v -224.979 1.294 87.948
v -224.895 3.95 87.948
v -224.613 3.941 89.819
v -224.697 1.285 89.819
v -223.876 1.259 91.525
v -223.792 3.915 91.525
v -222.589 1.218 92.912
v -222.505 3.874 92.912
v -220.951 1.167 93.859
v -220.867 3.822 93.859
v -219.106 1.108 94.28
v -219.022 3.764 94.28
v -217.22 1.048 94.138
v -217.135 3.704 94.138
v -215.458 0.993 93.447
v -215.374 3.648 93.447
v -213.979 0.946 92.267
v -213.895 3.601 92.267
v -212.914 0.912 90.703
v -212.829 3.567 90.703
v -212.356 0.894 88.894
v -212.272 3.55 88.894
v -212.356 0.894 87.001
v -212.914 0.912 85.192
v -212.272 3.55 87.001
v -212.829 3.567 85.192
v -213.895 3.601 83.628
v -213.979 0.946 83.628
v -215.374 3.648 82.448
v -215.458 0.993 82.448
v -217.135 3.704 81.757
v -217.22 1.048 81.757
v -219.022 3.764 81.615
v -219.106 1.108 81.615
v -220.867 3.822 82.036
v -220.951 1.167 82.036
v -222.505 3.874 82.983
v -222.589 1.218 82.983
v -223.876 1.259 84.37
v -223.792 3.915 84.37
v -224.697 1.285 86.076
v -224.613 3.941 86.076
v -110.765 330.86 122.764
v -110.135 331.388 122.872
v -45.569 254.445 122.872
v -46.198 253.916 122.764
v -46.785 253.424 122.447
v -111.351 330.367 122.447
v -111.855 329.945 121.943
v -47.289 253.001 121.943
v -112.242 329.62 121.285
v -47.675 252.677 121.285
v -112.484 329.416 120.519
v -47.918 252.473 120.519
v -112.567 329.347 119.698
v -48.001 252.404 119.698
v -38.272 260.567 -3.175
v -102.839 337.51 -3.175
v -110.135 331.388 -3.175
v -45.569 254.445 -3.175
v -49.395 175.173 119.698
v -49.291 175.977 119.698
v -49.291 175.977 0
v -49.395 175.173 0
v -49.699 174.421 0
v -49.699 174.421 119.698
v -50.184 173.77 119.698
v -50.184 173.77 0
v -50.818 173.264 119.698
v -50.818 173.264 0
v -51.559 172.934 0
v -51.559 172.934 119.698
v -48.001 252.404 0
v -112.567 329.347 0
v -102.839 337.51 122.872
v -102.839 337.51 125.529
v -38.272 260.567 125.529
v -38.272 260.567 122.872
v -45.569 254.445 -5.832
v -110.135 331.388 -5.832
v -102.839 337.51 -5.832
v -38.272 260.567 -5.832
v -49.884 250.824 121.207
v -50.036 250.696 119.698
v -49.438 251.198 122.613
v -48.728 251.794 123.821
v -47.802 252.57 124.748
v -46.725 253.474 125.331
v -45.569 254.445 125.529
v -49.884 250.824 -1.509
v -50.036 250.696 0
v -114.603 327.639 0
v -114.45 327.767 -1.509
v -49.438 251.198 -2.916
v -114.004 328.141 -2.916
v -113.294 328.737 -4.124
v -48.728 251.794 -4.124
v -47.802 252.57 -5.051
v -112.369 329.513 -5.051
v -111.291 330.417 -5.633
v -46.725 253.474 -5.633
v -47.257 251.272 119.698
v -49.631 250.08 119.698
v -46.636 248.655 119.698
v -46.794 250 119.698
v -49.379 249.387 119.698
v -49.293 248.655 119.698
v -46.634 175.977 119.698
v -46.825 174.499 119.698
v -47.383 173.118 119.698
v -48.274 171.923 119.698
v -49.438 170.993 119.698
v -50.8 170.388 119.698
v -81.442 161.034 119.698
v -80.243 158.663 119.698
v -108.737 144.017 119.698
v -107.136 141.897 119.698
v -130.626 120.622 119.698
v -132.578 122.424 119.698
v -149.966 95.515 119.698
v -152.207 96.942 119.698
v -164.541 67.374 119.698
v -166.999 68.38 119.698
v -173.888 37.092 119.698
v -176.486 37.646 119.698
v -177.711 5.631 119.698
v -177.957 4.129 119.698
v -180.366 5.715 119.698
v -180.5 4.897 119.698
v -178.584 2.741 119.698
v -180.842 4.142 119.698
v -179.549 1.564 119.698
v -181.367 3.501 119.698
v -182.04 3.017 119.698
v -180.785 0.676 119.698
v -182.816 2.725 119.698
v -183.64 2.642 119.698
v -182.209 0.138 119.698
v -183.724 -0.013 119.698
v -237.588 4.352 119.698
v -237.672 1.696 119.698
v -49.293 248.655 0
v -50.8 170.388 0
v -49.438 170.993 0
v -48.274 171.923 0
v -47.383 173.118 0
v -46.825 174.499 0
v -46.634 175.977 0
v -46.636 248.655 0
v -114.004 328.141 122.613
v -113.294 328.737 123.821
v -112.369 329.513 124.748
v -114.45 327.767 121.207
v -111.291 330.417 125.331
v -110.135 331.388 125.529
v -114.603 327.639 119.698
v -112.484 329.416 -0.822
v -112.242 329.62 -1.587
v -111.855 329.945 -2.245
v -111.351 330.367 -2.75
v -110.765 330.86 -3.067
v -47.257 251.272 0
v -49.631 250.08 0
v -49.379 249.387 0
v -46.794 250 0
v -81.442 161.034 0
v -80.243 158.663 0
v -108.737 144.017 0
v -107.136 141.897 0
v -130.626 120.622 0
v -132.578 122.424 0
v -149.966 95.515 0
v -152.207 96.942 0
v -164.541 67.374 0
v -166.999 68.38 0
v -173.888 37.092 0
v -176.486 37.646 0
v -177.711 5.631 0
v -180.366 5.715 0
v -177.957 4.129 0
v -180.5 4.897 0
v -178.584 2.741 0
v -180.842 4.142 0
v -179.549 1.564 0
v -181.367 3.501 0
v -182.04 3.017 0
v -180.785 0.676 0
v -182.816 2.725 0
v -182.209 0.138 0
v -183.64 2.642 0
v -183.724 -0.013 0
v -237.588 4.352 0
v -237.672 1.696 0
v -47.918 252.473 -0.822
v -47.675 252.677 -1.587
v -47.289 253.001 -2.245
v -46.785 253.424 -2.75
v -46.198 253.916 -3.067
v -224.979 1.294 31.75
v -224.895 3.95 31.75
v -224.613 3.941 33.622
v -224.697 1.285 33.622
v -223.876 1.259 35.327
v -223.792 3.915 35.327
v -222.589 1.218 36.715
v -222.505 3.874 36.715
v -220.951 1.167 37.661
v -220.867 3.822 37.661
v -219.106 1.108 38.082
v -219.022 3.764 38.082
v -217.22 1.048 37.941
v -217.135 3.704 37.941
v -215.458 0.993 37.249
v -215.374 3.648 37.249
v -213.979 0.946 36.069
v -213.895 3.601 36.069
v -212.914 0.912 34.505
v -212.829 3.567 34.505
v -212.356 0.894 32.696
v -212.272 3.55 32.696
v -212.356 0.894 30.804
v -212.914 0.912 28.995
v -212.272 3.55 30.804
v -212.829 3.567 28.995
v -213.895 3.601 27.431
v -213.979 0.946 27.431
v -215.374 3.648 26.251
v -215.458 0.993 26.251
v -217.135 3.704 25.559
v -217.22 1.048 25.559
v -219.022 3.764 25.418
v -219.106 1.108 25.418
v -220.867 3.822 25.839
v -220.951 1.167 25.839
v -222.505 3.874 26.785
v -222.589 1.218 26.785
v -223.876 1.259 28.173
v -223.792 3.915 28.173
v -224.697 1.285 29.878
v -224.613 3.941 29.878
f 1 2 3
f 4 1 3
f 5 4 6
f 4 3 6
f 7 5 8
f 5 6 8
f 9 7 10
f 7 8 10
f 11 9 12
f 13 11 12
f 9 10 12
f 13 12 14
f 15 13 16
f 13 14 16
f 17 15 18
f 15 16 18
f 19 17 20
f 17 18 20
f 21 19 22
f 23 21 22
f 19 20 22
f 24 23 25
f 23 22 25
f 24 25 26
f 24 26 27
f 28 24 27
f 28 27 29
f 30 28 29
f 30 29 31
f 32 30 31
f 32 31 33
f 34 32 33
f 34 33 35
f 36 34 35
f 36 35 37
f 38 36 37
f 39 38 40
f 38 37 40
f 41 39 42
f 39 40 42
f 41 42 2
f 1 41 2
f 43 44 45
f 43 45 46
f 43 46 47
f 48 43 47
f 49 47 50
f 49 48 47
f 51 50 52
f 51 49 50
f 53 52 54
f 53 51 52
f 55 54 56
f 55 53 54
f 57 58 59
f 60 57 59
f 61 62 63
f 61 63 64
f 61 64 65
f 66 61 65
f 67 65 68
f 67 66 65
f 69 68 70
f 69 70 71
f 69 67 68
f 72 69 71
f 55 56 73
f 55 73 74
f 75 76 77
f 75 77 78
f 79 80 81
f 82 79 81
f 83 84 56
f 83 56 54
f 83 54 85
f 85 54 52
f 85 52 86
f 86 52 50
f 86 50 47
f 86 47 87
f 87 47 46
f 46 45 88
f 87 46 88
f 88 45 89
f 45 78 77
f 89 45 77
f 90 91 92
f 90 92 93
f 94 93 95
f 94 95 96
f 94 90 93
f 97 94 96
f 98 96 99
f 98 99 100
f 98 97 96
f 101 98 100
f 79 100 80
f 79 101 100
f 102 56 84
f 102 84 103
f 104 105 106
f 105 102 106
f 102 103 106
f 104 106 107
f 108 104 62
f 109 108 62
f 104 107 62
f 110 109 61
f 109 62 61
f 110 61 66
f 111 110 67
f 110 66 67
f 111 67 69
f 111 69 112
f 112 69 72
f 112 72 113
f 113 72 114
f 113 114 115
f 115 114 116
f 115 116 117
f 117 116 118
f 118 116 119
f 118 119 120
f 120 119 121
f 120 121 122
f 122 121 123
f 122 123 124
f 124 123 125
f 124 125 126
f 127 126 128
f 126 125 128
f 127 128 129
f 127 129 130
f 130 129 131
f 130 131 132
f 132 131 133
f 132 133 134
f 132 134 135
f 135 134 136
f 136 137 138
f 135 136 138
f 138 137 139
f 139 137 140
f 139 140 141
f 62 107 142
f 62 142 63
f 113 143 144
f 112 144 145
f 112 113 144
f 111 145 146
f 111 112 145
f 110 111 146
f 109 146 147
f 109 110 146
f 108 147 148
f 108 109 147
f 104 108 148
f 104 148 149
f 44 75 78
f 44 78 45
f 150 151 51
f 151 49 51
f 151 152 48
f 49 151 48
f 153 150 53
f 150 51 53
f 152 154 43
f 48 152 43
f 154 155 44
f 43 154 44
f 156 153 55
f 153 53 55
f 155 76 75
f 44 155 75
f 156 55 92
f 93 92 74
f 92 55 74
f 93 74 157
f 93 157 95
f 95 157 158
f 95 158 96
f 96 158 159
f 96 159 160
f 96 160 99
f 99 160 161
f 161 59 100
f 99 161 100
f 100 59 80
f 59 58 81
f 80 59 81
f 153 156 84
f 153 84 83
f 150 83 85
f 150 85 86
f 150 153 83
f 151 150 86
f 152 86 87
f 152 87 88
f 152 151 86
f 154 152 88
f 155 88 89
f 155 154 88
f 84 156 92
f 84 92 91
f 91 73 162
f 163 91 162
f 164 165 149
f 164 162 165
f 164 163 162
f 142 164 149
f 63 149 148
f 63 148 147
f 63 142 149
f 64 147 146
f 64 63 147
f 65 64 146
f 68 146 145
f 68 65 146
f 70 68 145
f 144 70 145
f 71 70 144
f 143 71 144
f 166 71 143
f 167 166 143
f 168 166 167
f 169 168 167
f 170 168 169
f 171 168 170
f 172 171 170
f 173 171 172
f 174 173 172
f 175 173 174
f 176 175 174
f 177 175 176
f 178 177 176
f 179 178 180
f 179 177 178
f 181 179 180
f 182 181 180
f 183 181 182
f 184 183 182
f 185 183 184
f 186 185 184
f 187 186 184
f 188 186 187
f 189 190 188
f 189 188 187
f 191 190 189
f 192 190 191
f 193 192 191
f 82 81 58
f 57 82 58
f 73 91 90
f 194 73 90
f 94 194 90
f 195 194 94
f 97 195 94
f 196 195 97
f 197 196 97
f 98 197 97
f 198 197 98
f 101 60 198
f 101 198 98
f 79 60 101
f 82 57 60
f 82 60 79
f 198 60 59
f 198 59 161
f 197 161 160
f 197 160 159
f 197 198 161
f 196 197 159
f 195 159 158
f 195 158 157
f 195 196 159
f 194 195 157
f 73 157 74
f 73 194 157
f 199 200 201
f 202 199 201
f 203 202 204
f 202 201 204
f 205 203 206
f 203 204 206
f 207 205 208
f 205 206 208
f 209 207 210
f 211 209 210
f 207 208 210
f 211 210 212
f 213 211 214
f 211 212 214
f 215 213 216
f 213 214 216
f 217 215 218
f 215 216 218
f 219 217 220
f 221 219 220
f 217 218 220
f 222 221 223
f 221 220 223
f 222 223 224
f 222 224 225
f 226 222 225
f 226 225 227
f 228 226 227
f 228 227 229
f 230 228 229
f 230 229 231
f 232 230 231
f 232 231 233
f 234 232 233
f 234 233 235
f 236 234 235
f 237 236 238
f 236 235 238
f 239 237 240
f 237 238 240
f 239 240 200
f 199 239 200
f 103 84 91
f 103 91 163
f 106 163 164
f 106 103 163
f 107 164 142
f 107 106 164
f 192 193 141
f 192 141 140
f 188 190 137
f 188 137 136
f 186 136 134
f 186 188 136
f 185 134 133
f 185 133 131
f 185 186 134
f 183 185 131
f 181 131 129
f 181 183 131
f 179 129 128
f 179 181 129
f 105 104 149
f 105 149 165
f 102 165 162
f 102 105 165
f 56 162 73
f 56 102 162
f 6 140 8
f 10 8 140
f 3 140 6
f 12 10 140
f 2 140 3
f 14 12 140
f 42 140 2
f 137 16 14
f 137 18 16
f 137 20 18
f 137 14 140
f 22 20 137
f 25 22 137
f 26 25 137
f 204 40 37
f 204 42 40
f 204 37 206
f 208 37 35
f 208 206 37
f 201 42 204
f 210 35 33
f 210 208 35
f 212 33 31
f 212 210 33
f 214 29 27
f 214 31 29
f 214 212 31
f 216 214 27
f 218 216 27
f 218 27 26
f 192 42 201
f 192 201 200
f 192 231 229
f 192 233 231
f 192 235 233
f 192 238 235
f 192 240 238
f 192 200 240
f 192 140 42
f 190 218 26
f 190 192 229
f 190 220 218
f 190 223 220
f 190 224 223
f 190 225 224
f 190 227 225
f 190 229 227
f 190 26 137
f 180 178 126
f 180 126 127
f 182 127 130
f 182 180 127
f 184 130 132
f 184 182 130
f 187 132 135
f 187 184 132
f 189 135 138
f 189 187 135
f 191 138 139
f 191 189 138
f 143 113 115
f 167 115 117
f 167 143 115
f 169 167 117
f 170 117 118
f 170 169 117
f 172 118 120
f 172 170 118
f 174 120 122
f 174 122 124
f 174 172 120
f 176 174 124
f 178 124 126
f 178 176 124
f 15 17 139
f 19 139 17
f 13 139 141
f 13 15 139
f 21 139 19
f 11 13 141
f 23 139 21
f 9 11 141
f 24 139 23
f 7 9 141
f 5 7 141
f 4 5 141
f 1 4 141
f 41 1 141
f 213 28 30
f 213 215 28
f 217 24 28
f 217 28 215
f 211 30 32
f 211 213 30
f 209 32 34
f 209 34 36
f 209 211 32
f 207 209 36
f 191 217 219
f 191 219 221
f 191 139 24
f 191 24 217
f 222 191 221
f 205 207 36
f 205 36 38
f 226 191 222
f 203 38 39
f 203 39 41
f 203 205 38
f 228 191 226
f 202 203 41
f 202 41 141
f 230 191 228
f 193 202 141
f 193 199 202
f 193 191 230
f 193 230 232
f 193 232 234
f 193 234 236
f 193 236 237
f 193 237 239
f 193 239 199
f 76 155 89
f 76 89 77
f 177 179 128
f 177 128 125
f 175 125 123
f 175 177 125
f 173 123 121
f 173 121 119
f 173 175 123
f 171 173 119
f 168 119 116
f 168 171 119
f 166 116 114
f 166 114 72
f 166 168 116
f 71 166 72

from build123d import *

# Parameters (mm, degrees)
BASE_FLANGE1_DEPTH           = 119.6975
EDGE_FLANGE1_DEPTH           = 119.6975
EDGE_FLANGE2_STRIP_CUT_DEPTH = 119.6975
EDGE_FLANGE2_DEPTH           = 119.6975
EDGE_FLANGE3_DEPTH           = 119.6975
SKETCH20_R                   = 6.35
CUT_EXTRUDE1_DEPTH           = 2.65684
EDGE_FLANGE4_DEPTH           = 100.444394506
EDGE_FLANGE5_DEPTH           = 100.444394506


# Sheet-metal steps are written as plain solids
with BuildPart() as part:
    # Sketch1 → Base-Flange1 (new body)
    with BuildSketch(Plane.XY):
        with BuildLine():
            ThreePointArc((-50.8, 170.388379885), (-140.856418383, 108.500273734), (-177.710803869, 5.63118))
            Line((-177.710803869, 5.63118), (-180.366311024, 5.715325918))
            ThreePointArc((-180.366311024, 5.715325918), (-142.961215721, 110.121577824), (-51.559097143, 172.934469105))
            Line((-51.559097143, 172.934469105), (-50.8, 170.388379885))
        make_face()
    extrude(amount=BASE_FLANGE1_DEPTH)

    # Edge-Flange1 section (across the edge) → Edge-Flange1 (add)
    with BuildSketch(Plane(origin=(-49.291175996, 173.610632552, 119.6975), x_dir=(-0.9999999996342678, -2.7045604981568168e-05, 0), z_dir=(0, 0, -1))):
        with BuildLine():
            Line((-2.65684, 2.366572064), (-2.65684, 76.2))
            Line((-2.65684, 76.2), (0, 76.2))
            Line((0, 76.2), (0, 2.366572064))
            ThreePointArc((0, 2.366572064), (0.62936233, 0.469112223), (2.267939433, -0.676102109))
            Line((2.267939433, -0.676102109), (1.508911151, -3.222211858))
            ThreePointArc((1.508911151, -3.222211858), (-1.500827273, -1.118682173), (-2.65684, 2.366572064))
        make_face()
    extrude(amount=EDGE_FLANGE1_DEPTH)

    # Edge-Flange2 strip (across the edge) → Edge-Flange2 strip cut (cut)
    with BuildSketch(Plane(origin=(-49.293236871, 249.810632524, 119.6975), x_dir=(-0.7660270582590358, -0.6428083275868537, 0), z_dir=(0, 0, -1))):
        Polygon((-12.205285278, 10.412383287), (-1.292448625, -2.593029), (0.742808893, -0.885245167), (-10.17002776, 12.12016712), align=None)
    extrude(amount=EDGE_FLANGE2_STRIP_CUT_DEPTH, mode=Mode.SUBTRACT)

    # Edge-Flange2 section (across the edge) → Edge-Flange2 (add)
    with BuildSketch(Plane(origin=(-49.293236871, 249.810632524, 119.6975), x_dir=(-0.7660270582590358, -0.6428083275868537, 0), z_dir=(0, 0, -1))):
        with BuildLine():
            Line((-2.65684, 1.155605494), (-2.65684, 101.6))
            Line((-2.65684, 101.6), (0, 101.6))
            Line((0, 101.6), (0, 1.155605494))
            ThreePointArc((0, 1.155605494), (0.191475929, 0.069691539), (0.742808893, -0.885245167))
            Line((0.742808893, -0.885245167), (-1.292448625, -2.593029))
            ThreePointArc((-1.292448625, -2.593029), (-2.305137014, -0.839001259), (-2.65684, 1.155605494))
        make_face()
    extrude(amount=EDGE_FLANGE2_DEPTH)

    # Edge-Flange3 section (across the edge) → Edge-Flange3 (add)
    with BuildSketch(Plane(origin=(-180.46686781, 2.541918706, 0), x_dir=(0.0316714285714251, 0.9994983344719717, 0), z_dir=(0, 0, 1))):
        with BuildLine():
            Line((-2.65684, 3.175), (-2.65684, 57.15))
            Line((-2.65684, 57.15), (0, 57.15))
            Line((0, 57.15), (0, 3.175))
            ThreePointArc((0, 3.175), (0.92993597, 0.92993597), (3.175, 0))
            Line((3.175, 0), (3.175, -2.65684))
            ThreePointArc((3.175, -2.65684), (-0.948733611, -0.948733611), (-2.65684, 3.175))
        make_face()
    extrude(amount=EDGE_FLANGE3_DEPTH)

    # Sketch20 → Cut-Extrude1 (cut)
    with BuildSketch(Plane(origin=(-0.100556786, -3.173407212, 0), x_dir=(0.9994983344719716, -0.03167142857142512, 0), z_dir=(0.03167142857142512, 0.9994983344719717, 0))):
        with Locations(Location((-218.55684, -31.75, 0), (0, 0, 180))):
            Circle(SKETCH20_R)
        with Locations(Location((-218.55684, -87.9475, 0), (0, 0, 180))):
            Circle(SKETCH20_R)
    extrude(amount=-CUT_EXTRUDE1_DEPTH, mode=Mode.SUBTRACT)

    # Edge-Flange4 section (across the edge) → Edge-Flange4 (add)
    with BuildSketch(Plane(origin=(-112.567351624, 329.34682052, 122.8725), x_dir=(0, 0, -1), z_dir=(0.6428083275868537, -0.7660270582590358, 0))):
        with BuildLine():
            Line((-2.65684, 3.175), (-2.65684, 12.7))
            Line((-2.65684, 12.7), (0, 12.7))
            Line((0, 12.7), (0, 3.175))
            ThreePointArc((0, 3.175), (0.92993597, 0.92993597), (3.175, 0))
            Line((3.175, 0), (3.175, -2.65684))
            ThreePointArc((3.175, -2.65684), (-0.948733611, -0.948733611), (-2.65684, 3.175))
        make_face()
    extrude(amount=EDGE_FLANGE4_DEPTH)

    # Edge-Flange5 section (across the edge) → Edge-Flange5 (add)
    with BuildSketch(Plane(origin=(-48.000858376, 252.403696478, -3.175), x_dir=(0, 0, 1), z_dir=(-0.642808327586854, 0.7660270582590356, 0))):
        with BuildLine():
            Line((-2.65684, 3.175), (-2.65684, 12.7))
            Line((-2.65684, 12.7), (0, 12.7))
            Line((0, 12.7), (0, 3.175))
            ThreePointArc((0, 3.175), (0.92993597, 0.92993597), (3.175, 0))
            Line((3.175, 0), (3.175, -2.65684))
            ThreePointArc((3.175, -2.65684), (-0.948733611, -0.948733611), (-2.65684, 3.175))
        make_face()
    extrude(amount=EDGE_FLANGE5_DEPTH)


solid = part.part
